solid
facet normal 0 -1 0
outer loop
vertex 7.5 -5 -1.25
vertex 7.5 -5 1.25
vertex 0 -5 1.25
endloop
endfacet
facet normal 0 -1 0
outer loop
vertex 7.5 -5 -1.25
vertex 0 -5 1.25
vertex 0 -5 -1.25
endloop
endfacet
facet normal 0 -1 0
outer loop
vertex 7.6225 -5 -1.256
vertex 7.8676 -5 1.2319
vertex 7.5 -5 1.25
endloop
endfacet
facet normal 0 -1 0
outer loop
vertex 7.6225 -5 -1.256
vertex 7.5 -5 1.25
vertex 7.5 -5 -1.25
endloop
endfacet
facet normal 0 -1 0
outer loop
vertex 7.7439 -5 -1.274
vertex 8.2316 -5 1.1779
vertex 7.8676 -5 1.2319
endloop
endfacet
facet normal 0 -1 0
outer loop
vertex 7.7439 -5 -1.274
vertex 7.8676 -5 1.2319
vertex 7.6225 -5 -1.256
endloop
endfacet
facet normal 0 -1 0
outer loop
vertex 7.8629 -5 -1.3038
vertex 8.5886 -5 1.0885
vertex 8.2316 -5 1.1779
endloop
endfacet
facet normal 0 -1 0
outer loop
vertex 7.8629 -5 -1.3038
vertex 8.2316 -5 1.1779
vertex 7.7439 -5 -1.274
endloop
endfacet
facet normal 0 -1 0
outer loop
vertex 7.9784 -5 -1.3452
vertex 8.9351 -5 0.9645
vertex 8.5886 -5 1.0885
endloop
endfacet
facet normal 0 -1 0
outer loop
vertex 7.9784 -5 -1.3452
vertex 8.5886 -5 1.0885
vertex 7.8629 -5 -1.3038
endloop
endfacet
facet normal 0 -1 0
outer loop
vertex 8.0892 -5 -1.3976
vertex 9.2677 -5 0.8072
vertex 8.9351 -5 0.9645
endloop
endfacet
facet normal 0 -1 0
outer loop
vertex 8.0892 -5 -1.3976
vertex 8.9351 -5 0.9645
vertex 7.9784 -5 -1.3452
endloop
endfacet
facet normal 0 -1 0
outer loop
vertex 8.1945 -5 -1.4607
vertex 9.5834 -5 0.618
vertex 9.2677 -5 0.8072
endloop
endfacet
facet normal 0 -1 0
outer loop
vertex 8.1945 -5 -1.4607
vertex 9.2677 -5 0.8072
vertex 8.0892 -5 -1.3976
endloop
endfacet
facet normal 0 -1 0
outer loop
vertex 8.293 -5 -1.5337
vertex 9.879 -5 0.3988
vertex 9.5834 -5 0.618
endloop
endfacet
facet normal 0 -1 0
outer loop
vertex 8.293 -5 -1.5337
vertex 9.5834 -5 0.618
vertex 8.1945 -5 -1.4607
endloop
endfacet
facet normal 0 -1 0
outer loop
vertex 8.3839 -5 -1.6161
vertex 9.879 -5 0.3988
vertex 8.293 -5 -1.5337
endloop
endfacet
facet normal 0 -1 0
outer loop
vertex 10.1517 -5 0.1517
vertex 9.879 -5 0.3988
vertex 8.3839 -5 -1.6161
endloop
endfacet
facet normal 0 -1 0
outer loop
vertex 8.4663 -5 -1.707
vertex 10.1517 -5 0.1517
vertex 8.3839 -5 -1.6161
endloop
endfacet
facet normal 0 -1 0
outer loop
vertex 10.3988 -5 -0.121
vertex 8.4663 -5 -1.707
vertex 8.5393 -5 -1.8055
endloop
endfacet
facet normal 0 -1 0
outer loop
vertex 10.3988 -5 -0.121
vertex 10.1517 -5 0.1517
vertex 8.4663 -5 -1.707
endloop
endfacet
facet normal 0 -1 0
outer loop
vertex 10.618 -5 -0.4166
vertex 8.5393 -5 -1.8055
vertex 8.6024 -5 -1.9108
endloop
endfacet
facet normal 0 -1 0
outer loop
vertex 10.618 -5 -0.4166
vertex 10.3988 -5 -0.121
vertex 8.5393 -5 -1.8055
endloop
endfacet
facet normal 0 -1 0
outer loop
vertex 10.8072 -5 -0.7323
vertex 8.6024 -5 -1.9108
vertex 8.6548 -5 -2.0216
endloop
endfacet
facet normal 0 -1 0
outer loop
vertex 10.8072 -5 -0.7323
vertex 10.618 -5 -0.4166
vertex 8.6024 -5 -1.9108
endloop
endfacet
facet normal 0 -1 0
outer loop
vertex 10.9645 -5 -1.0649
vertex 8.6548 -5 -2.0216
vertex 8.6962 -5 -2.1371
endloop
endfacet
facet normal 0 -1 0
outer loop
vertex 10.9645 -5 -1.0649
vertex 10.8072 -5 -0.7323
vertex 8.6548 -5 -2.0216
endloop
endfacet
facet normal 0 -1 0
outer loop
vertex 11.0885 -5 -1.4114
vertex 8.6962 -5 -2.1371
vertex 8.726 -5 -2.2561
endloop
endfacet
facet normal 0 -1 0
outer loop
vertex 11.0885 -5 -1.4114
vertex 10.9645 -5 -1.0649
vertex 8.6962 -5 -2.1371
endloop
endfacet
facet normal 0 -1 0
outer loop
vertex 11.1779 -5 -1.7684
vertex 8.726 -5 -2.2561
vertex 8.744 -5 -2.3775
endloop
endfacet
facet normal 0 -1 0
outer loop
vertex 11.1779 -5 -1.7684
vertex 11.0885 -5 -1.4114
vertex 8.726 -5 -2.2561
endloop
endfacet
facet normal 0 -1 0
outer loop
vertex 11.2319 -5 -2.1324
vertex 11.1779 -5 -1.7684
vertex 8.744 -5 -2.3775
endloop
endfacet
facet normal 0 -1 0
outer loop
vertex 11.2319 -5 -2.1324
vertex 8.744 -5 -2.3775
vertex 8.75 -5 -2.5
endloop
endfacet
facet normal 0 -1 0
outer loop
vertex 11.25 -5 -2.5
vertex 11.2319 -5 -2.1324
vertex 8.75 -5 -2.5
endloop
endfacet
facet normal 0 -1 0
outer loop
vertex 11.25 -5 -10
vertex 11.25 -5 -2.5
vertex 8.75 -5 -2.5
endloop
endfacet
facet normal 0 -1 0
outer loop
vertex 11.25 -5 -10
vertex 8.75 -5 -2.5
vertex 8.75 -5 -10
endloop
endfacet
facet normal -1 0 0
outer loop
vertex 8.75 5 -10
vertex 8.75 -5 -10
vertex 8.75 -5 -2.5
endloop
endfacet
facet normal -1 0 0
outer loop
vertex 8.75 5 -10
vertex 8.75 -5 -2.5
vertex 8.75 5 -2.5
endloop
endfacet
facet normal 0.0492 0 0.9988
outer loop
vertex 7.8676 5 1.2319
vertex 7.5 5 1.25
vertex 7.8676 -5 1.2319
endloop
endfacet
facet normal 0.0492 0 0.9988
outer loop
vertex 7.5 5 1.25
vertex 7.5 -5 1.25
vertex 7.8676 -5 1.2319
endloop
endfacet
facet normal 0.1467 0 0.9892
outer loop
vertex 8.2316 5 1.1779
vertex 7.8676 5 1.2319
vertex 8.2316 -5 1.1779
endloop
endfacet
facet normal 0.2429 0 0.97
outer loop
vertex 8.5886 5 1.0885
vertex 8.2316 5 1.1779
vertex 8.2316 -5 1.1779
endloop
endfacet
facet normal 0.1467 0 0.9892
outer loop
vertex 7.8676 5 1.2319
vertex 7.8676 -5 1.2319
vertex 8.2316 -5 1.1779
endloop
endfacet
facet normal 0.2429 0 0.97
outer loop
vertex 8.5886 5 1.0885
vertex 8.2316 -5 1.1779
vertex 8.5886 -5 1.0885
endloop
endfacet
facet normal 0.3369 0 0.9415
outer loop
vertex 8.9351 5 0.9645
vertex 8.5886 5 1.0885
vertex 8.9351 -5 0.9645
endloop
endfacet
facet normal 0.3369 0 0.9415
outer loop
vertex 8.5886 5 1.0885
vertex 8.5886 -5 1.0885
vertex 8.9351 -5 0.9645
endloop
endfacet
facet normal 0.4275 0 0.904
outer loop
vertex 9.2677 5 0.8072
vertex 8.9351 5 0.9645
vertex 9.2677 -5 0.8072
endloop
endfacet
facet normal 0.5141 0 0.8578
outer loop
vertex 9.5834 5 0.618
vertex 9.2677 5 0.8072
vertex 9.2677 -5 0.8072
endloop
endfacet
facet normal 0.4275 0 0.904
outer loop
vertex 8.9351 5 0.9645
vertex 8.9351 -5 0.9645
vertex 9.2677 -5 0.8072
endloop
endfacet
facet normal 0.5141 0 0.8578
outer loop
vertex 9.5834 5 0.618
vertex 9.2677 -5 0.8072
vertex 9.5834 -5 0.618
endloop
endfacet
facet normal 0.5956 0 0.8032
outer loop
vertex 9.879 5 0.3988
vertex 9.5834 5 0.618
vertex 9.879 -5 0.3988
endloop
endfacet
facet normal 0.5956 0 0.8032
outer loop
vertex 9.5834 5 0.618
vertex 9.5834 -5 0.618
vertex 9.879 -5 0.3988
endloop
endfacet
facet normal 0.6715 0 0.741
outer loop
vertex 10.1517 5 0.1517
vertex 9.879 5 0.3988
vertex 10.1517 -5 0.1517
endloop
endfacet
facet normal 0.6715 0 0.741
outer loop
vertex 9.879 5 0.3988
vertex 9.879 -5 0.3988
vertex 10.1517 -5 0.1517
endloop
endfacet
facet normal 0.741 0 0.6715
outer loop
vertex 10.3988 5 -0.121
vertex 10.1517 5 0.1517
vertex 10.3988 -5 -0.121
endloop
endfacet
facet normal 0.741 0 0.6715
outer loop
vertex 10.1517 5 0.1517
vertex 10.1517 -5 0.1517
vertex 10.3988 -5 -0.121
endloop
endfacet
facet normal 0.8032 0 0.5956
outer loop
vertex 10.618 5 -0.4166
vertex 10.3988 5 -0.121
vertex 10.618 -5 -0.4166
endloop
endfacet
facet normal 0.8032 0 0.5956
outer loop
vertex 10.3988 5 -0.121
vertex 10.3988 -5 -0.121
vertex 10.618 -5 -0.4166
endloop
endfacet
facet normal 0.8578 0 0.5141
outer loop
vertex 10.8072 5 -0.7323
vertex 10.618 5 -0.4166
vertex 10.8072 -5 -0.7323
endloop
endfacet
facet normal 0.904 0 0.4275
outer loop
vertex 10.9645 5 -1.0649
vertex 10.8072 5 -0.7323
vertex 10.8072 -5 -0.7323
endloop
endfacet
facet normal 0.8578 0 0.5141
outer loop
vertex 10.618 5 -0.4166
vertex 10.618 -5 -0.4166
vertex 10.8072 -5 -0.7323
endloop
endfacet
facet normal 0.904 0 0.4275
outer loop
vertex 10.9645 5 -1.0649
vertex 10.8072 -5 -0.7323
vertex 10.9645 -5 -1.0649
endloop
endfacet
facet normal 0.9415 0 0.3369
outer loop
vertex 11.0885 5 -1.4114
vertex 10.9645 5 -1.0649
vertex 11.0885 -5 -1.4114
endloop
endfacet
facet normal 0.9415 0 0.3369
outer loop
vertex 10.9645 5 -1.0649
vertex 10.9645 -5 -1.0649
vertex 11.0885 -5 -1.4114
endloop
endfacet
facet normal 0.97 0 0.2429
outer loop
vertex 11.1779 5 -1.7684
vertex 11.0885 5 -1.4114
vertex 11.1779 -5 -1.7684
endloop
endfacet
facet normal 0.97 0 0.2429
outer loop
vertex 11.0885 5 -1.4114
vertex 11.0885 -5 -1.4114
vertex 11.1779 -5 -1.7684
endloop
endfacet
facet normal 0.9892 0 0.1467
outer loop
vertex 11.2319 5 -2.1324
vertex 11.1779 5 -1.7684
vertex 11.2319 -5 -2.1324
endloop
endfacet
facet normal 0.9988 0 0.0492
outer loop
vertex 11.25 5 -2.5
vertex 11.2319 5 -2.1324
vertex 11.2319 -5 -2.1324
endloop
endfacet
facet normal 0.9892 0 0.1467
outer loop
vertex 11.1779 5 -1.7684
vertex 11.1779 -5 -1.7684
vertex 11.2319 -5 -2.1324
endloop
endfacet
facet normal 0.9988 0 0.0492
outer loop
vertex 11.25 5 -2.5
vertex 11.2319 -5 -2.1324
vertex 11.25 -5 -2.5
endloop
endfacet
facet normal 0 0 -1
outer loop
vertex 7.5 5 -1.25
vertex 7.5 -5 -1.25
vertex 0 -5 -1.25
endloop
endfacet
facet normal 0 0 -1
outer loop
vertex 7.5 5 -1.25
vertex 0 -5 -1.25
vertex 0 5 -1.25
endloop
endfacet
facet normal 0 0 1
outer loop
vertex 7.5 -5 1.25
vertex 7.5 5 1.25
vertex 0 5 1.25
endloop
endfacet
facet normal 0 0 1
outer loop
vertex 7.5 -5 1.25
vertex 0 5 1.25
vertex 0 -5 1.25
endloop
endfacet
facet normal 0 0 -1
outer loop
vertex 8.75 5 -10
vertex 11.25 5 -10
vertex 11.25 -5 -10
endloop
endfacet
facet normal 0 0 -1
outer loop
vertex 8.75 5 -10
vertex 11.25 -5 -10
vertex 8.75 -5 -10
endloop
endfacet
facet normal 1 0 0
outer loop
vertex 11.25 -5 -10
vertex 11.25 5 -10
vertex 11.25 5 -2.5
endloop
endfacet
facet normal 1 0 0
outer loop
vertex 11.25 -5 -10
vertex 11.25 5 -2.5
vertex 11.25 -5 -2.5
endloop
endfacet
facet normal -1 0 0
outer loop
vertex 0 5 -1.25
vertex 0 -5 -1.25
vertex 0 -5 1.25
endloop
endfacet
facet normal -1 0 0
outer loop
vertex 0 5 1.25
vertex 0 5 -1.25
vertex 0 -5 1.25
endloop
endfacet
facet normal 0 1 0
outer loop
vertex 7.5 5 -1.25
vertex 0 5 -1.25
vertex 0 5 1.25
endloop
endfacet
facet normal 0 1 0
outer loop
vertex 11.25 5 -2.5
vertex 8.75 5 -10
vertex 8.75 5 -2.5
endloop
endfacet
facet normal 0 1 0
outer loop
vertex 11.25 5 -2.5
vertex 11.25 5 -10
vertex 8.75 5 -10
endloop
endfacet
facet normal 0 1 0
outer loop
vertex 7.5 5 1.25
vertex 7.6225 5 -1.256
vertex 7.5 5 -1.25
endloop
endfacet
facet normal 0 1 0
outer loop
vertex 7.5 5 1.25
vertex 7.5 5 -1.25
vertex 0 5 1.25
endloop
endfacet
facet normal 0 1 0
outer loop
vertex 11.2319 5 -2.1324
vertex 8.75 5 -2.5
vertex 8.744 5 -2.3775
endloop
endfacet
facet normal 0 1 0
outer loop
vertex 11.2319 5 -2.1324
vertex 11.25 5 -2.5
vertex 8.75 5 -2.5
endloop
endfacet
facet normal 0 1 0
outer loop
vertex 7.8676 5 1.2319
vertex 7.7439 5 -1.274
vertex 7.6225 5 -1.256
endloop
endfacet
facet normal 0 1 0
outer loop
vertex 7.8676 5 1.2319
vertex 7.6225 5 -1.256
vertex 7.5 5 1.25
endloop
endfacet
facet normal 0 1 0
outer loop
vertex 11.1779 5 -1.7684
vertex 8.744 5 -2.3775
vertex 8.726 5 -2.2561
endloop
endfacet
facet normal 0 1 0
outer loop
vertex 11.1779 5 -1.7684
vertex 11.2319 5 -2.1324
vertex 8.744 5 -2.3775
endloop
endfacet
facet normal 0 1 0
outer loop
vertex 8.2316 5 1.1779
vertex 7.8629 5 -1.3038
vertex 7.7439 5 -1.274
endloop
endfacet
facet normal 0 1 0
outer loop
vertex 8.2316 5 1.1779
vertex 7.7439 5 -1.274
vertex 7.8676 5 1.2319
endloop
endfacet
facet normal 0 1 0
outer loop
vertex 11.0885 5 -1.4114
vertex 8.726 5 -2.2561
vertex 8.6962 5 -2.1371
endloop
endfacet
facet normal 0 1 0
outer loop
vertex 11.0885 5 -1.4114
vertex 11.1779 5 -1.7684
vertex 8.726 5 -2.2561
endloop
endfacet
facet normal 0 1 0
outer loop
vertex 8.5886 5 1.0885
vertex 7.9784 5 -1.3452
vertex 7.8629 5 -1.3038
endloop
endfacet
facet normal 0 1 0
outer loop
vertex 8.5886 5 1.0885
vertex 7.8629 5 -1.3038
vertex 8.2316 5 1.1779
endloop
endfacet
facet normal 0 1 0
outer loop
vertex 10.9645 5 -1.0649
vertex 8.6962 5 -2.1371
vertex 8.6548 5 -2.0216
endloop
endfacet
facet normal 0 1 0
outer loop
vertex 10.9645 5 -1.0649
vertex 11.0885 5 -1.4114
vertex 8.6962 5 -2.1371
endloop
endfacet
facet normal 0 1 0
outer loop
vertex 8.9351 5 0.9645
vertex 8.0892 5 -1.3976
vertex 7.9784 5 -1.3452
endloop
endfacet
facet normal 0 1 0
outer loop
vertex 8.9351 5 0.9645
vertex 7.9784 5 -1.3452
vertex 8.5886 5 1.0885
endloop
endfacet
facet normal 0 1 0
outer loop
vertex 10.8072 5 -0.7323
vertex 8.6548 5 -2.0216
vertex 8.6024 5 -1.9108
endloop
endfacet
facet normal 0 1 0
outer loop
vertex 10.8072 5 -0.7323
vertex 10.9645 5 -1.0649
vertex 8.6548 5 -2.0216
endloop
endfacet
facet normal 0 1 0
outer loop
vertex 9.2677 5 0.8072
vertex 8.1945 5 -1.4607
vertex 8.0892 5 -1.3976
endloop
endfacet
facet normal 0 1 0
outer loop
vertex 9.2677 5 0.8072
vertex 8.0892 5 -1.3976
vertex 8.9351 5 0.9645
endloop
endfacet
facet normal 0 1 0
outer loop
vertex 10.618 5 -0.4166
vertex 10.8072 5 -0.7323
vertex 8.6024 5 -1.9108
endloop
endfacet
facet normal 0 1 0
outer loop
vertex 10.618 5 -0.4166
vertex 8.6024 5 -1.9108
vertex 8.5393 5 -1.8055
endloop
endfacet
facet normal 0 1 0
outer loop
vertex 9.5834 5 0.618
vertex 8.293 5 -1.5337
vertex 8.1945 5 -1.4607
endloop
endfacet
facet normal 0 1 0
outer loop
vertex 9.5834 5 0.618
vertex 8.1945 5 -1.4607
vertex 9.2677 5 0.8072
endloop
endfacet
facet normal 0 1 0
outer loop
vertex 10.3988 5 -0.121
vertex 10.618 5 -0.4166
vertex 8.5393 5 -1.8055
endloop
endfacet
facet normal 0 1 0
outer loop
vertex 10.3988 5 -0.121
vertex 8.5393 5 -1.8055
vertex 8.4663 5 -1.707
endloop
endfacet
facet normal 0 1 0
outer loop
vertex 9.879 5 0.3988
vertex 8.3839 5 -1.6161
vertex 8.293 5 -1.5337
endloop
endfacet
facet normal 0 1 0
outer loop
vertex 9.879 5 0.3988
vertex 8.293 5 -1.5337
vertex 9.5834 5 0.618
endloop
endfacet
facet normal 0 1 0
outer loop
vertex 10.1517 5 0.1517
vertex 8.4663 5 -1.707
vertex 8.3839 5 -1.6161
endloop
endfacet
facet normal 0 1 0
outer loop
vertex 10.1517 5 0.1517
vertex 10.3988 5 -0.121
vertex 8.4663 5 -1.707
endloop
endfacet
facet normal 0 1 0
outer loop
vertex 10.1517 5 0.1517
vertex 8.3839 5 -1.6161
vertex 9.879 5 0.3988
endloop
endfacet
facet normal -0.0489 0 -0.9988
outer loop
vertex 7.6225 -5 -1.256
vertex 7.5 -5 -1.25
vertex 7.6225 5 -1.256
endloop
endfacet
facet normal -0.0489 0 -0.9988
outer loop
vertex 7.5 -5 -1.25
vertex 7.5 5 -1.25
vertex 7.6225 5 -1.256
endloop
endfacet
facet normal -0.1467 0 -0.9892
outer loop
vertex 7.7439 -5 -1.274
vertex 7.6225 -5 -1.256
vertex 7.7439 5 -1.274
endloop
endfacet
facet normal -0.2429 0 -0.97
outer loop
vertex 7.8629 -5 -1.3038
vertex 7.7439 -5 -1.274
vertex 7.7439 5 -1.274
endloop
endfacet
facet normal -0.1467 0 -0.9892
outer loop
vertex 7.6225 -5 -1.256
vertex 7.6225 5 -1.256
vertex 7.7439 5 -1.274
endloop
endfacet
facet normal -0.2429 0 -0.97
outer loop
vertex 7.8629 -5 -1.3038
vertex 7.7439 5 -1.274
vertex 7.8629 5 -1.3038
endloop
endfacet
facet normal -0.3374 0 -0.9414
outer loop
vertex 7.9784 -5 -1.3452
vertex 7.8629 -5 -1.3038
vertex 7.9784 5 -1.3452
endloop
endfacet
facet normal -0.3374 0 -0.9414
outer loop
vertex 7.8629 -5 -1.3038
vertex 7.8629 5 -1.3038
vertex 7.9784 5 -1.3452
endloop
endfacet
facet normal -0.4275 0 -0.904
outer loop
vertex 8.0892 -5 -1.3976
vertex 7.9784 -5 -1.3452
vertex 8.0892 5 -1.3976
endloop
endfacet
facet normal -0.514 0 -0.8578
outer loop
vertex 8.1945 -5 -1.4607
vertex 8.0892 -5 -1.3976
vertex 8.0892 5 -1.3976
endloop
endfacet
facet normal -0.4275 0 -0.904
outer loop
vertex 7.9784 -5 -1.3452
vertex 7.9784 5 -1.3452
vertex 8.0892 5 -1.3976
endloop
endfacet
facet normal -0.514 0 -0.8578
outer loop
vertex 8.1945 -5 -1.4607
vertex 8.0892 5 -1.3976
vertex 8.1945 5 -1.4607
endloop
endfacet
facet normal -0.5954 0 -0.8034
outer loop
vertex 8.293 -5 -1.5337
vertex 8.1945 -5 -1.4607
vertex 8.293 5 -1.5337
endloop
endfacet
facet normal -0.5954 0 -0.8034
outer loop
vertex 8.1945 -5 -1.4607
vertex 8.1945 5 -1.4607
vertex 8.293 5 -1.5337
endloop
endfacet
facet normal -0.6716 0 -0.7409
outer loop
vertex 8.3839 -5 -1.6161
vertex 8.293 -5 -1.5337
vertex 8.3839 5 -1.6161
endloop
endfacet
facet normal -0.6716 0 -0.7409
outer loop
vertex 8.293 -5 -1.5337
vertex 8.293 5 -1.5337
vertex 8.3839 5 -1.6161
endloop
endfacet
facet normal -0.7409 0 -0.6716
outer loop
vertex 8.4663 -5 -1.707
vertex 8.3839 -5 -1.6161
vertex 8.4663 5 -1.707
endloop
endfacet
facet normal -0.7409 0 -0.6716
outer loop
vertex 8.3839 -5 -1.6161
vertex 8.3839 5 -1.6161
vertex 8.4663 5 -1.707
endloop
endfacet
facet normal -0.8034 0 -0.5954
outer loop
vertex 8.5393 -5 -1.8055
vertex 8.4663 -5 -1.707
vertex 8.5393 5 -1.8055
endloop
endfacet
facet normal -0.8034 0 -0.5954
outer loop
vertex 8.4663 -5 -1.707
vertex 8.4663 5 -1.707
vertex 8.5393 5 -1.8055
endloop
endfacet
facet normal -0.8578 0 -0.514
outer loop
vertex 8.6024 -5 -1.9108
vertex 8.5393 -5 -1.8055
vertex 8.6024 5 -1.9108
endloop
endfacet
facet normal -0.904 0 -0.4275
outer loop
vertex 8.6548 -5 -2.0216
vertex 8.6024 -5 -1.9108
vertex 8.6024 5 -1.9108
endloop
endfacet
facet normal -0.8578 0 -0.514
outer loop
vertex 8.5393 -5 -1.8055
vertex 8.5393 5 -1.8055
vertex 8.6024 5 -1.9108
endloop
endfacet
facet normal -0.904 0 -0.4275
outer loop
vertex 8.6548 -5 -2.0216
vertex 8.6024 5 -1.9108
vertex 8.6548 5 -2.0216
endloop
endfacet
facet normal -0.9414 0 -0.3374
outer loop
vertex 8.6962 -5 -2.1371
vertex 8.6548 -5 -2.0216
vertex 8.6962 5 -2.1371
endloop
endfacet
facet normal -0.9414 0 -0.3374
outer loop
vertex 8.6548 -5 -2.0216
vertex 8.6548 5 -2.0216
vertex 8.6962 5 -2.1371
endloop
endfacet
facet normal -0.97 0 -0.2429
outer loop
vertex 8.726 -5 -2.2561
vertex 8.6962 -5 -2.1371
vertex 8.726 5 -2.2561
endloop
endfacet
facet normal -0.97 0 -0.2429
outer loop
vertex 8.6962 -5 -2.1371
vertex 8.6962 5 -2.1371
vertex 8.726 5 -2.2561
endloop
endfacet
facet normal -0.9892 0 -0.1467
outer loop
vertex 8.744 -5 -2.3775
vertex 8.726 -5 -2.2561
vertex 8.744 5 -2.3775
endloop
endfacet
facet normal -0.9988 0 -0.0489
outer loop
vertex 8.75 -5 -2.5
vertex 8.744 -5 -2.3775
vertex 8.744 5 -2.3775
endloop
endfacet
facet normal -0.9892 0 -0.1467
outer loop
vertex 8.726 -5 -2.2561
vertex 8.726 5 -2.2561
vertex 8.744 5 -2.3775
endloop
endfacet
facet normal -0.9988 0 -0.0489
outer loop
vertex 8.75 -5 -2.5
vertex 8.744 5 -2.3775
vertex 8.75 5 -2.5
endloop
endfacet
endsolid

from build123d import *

# Parameters (mm, degrees)
F1_W = 10
F1_H = 2.5


with BuildPart() as f2:
    # F2: sweep along a path in F0
    with BuildLine(Plane.XZ) as f2_path:
        Line((0, 0), (7.5, 0))
        ThreePointArc((7.5, 0), (9.267767, -0.732233), (10, -2.5))
        Line((10, -2.5), (10, -10))
    # F1 (on Right) → F2 (sweep)
    with BuildSketch(Plane.YZ):
        Rectangle(F1_W, F1_H)
    sweep(path=f2_path.line)


solid = f2.part
